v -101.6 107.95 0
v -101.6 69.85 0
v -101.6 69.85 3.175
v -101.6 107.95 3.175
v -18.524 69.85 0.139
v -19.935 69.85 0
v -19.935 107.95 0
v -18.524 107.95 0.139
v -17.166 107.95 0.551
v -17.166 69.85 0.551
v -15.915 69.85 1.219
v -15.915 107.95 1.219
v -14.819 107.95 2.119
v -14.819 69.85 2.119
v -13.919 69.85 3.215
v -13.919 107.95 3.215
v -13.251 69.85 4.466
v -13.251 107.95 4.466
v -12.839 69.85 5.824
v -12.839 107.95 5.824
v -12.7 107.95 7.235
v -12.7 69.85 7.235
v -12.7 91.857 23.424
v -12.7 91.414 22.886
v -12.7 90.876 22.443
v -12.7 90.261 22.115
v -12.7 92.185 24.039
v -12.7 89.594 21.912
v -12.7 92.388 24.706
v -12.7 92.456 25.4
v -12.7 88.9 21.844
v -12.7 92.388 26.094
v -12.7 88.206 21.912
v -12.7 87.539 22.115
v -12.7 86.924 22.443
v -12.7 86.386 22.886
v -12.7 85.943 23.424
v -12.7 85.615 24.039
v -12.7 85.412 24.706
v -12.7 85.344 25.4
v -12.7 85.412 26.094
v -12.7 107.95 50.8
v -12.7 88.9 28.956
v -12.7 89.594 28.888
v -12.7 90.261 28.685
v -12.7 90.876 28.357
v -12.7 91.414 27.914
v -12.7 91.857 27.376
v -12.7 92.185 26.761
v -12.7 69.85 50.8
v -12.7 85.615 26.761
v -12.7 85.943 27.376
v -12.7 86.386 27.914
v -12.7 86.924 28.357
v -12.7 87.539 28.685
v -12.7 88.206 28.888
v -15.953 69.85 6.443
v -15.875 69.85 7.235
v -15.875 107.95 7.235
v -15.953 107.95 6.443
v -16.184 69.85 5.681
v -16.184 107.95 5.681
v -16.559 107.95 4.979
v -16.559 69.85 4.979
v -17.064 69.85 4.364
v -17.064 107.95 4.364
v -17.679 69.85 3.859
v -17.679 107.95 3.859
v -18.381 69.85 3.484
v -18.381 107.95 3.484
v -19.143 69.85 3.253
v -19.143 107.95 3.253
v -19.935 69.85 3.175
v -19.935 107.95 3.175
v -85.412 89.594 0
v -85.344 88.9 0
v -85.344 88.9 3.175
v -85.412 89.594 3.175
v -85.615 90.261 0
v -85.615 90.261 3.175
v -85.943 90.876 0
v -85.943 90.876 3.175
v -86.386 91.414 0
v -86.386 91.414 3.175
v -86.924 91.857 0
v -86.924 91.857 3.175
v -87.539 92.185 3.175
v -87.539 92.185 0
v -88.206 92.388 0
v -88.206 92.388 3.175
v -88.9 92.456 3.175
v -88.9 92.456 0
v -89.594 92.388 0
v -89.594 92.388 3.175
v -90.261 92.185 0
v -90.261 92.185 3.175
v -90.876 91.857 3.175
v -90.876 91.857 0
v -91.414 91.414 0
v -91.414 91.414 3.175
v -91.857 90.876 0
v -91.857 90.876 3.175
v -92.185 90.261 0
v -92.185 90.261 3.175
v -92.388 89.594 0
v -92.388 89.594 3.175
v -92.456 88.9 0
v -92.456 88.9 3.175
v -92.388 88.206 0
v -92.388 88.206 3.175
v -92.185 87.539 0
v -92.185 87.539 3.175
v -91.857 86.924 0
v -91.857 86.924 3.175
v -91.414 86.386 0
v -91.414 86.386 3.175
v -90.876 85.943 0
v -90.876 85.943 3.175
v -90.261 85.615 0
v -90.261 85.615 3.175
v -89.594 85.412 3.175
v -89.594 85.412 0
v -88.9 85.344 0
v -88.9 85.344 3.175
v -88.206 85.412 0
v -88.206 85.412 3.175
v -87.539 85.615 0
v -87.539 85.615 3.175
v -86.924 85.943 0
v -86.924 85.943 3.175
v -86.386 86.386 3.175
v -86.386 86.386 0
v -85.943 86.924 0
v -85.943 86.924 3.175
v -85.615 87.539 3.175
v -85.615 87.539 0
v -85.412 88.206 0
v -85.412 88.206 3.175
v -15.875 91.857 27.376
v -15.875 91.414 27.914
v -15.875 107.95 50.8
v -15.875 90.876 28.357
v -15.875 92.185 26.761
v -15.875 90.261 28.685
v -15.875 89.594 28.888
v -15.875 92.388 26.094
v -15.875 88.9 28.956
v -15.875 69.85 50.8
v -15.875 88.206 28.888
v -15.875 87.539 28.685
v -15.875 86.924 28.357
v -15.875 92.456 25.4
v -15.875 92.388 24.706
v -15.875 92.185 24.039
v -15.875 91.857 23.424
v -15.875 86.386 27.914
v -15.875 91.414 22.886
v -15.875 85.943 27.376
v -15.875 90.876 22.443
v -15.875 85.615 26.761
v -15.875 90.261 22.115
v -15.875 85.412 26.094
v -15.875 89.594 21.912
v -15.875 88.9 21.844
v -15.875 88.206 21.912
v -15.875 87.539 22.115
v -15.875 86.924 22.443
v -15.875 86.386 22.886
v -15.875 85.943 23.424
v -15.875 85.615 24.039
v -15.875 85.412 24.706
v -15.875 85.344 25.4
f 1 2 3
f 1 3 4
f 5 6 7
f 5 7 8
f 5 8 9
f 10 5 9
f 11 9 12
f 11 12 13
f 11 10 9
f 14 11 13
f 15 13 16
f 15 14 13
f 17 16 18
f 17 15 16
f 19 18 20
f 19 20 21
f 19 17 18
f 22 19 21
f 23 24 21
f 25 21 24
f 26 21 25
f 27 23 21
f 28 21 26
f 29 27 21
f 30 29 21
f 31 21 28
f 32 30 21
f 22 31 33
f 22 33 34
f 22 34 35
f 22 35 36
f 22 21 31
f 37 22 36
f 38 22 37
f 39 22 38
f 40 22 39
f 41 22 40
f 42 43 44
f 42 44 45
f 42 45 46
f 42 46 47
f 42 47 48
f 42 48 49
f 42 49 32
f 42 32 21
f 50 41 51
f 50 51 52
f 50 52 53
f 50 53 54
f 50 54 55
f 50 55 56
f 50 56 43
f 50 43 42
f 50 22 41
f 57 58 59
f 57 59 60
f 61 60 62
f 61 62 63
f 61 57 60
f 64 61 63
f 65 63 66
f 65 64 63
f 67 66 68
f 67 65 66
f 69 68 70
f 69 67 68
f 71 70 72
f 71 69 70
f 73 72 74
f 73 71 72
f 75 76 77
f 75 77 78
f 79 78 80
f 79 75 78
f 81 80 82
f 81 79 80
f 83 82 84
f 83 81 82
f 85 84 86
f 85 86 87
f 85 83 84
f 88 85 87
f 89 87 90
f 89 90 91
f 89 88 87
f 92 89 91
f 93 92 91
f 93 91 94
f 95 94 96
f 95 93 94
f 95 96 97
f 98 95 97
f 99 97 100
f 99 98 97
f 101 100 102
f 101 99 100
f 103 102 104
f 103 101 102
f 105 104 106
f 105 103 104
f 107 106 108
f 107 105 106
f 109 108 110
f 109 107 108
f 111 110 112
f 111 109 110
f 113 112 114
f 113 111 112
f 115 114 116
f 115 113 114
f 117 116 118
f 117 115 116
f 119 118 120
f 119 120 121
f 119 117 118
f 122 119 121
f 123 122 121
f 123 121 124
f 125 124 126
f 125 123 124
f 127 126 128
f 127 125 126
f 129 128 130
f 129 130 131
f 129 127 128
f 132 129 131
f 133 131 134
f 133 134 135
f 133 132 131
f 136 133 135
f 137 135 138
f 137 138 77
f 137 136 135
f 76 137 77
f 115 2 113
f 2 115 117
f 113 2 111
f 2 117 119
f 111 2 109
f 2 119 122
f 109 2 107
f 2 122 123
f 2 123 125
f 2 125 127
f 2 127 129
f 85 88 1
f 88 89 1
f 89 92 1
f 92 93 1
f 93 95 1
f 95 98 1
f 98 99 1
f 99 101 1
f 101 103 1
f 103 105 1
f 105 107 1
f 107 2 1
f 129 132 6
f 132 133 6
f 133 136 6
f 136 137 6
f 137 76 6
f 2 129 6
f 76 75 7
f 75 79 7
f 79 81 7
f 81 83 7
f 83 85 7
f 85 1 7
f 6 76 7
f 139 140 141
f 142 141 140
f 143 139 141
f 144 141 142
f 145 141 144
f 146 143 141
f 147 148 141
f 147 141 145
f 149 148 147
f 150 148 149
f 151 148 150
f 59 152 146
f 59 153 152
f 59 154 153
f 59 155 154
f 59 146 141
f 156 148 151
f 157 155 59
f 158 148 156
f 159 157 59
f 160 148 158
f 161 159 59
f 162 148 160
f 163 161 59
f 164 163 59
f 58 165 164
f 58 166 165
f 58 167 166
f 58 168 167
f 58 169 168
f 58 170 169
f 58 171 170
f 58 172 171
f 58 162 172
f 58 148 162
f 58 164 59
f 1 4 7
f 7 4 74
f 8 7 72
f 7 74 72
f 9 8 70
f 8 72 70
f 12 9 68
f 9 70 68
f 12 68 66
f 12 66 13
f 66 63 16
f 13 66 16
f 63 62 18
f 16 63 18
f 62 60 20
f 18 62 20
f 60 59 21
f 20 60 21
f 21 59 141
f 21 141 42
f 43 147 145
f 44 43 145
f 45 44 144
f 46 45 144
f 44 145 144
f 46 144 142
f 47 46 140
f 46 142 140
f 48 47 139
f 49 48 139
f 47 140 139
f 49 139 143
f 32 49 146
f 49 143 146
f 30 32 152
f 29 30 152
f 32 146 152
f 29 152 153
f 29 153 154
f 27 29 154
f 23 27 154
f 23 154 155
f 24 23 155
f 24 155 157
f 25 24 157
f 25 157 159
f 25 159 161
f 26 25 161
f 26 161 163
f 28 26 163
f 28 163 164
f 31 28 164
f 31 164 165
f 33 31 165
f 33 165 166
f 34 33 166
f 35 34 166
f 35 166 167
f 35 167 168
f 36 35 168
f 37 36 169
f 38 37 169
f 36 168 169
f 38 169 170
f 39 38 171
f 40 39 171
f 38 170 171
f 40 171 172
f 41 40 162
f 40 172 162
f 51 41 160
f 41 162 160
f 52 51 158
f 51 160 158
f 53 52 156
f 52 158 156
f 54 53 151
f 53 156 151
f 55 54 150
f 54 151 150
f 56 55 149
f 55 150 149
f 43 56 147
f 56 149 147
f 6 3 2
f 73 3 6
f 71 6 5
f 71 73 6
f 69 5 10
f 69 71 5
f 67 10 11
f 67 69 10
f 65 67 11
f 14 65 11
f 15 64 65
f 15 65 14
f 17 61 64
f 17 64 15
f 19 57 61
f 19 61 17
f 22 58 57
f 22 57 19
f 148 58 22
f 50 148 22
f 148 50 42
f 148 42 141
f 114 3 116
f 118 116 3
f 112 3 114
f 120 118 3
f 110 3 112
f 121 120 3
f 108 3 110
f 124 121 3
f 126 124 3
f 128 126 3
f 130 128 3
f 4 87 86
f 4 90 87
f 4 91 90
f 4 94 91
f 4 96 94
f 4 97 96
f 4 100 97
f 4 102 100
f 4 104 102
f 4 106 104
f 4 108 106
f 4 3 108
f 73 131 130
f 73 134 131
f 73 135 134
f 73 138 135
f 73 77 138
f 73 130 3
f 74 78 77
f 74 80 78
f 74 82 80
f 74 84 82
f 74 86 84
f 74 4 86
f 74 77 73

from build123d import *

# Parameters (mm, degrees)
SKETCH1_W                    = 88.9
SKETCH1_H                    = 38.1
SKETCH1_R                    = 3.556
BASE_FLANGE1_DEPTH           = 3.175
EDGE_FLANGE1_STRIP_W         = 20.82
EDGE_FLANGE1_STRIP_H         = 3.175
EDGE_FLANGE1_STRIP_CUT_DEPTH = 38.1
EDGE_FLANGE1_DEPTH           = 38.1
SKETCH9_R                    = 3.556
CUT_EXTRUDE1_DEPTH           = 147.910238326


# Sheet-metal steps are written as plain solids
with BuildPart() as part:
    # Sketch1 → Base-Flange1 (new body)
    with BuildSketch(Plane.XY):
        with Locations((-57.15, 88.9)):
            Rectangle(SKETCH1_W, SKETCH1_H)
        with Locations((-88.9, 88.9)):
            Circle(SKETCH1_R, mode=Mode.SUBTRACT)
    extrude(amount=BASE_FLANGE1_DEPTH)

    # Edge-Flange1 strip (across the edge) → Edge-Flange1 strip cut (cut)
    with BuildSketch(Plane(origin=(-12.7, 69.85, 3.175), x_dir=(-1, 0, 0), z_dir=(0, 1, 0))):
        with Locations((-3.175, -1.5875)):
            Rectangle(EDGE_FLANGE1_STRIP_W, EDGE_FLANGE1_STRIP_H)
    extrude(amount=EDGE_FLANGE1_STRIP_CUT_DEPTH, mode=Mode.SUBTRACT)

    # Edge-Flange1 section (across the edge) → Edge-Flange1 (add)
    with BuildSketch(Plane(origin=(-12.7, 69.85, 3.175), x_dir=(-1, 0, 0), z_dir=(0, 1, 0))):
        with BuildLine():
            Line((0, 4.06), (0, 47.625))
            Line((0, 47.625), (3.175, 47.625))
            Line((3.175, 47.625), (3.175, 4.06))
            ThreePointArc((3.175, 4.06), (4.364146468, 1.189146468), (7.235, 0))
            Line((7.235, 0), (7.235, -3.175))
            ThreePointArc((7.235, -3.175), (2.119082438, -1.055917562), (0, 4.06))
        make_face()
    extrude(amount=EDGE_FLANGE1_DEPTH)

    # Sketch9 → Cut-Extrude1 (cut, through all)
    with BuildSketch(Plane.ZY.offset(15.875)):
        with Locations((25.4, 88.9)):
            Circle(SKETCH9_R)
    extrude(amount=-CUT_EXTRUDE1_DEPTH, mode=Mode.SUBTRACT)


solid = part.part
